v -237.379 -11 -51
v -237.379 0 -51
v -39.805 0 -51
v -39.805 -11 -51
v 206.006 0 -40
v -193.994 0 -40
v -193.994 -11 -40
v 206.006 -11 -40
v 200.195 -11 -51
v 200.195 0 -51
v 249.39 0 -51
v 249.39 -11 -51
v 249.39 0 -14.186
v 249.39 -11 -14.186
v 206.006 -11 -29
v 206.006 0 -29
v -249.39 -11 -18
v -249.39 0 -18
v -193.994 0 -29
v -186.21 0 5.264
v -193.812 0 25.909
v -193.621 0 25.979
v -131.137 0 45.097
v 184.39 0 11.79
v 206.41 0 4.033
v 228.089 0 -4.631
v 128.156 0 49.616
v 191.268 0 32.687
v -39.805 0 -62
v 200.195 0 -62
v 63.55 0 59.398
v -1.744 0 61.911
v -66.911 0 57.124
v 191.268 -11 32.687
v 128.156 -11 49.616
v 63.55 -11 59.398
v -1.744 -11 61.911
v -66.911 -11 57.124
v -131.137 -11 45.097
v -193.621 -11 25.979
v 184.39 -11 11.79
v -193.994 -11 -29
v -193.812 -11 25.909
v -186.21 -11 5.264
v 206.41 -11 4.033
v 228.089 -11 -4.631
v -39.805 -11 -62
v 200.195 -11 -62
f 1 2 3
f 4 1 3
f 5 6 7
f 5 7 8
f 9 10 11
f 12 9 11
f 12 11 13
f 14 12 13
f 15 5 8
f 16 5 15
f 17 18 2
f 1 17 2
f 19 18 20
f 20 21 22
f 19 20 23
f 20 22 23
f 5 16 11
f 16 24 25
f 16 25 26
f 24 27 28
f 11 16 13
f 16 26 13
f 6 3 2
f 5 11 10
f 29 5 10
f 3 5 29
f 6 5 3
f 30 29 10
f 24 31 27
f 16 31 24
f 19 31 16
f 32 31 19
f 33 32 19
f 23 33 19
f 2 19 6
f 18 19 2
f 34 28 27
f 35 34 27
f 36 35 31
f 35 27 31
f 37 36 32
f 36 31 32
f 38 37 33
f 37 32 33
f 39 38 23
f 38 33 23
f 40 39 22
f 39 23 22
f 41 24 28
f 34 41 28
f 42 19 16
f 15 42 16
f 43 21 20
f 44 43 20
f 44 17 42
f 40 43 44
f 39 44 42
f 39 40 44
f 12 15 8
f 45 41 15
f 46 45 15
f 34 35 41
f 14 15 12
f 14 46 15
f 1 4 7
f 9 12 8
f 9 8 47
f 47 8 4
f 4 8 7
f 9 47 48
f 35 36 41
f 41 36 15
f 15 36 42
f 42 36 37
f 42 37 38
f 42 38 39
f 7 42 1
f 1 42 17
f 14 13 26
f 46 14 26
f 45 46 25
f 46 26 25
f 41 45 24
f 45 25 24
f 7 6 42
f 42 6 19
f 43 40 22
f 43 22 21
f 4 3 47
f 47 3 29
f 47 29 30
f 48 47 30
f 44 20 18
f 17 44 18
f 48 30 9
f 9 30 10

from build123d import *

# Parameters (mm, degrees)
F0_W     = 400
F0_H     = 11
F1_DEPTH = 11


# Not quite as in the source:
# - ends of sketch curves that miss each other by under 0.0002 mm in the source are joined


with BuildPart() as f1:
    # F0 (on Front) → F1 (new body)
    with BuildSketch(Plane.XZ):
        with BuildLine():
            Line((-186.2102279461, 5.2641338535), (-249.389773, -18))
            Line((-249.389773, -18), (-237.378755, -51))
            Line((-237.378755, -51), (-39.805119, -51))
            Line((-39.805119, -51), (-39.805119, -62))
            Line((-39.805119, -62), (200.194881, -62))
            Line((200.194881, -62), (200.194881, -51))
            Line((200.194881, -51), (249.389772, -51))
            Line((249.389772, -51), (249.389772, -14.186388))
            ThreePointArc((249.389772, -14.186388), (217.2940285637, -0.1866284114), (184.3897718043, 11.7900114054))
            Line((184.3897718043, 11.7900114054), (191.267695, 32.687241))
            ThreePointArc((191.267695, 32.687241), (-1.7442805029, 61.9112120177), (-193.620736559, 25.9794888024))
            Line((-193.620736559, 25.9794888024), (-193.812138, 25.909012))
            Line((-193.812138, 25.909012), (-186.2102279461, 5.2641338535))
        make_face()
        with Locations((6.005508, -34.5)):
            Rectangle(F0_W, F0_H, mode=Mode.SUBTRACT)
    extrude(amount=F1_DEPTH)


solid = f1.part
